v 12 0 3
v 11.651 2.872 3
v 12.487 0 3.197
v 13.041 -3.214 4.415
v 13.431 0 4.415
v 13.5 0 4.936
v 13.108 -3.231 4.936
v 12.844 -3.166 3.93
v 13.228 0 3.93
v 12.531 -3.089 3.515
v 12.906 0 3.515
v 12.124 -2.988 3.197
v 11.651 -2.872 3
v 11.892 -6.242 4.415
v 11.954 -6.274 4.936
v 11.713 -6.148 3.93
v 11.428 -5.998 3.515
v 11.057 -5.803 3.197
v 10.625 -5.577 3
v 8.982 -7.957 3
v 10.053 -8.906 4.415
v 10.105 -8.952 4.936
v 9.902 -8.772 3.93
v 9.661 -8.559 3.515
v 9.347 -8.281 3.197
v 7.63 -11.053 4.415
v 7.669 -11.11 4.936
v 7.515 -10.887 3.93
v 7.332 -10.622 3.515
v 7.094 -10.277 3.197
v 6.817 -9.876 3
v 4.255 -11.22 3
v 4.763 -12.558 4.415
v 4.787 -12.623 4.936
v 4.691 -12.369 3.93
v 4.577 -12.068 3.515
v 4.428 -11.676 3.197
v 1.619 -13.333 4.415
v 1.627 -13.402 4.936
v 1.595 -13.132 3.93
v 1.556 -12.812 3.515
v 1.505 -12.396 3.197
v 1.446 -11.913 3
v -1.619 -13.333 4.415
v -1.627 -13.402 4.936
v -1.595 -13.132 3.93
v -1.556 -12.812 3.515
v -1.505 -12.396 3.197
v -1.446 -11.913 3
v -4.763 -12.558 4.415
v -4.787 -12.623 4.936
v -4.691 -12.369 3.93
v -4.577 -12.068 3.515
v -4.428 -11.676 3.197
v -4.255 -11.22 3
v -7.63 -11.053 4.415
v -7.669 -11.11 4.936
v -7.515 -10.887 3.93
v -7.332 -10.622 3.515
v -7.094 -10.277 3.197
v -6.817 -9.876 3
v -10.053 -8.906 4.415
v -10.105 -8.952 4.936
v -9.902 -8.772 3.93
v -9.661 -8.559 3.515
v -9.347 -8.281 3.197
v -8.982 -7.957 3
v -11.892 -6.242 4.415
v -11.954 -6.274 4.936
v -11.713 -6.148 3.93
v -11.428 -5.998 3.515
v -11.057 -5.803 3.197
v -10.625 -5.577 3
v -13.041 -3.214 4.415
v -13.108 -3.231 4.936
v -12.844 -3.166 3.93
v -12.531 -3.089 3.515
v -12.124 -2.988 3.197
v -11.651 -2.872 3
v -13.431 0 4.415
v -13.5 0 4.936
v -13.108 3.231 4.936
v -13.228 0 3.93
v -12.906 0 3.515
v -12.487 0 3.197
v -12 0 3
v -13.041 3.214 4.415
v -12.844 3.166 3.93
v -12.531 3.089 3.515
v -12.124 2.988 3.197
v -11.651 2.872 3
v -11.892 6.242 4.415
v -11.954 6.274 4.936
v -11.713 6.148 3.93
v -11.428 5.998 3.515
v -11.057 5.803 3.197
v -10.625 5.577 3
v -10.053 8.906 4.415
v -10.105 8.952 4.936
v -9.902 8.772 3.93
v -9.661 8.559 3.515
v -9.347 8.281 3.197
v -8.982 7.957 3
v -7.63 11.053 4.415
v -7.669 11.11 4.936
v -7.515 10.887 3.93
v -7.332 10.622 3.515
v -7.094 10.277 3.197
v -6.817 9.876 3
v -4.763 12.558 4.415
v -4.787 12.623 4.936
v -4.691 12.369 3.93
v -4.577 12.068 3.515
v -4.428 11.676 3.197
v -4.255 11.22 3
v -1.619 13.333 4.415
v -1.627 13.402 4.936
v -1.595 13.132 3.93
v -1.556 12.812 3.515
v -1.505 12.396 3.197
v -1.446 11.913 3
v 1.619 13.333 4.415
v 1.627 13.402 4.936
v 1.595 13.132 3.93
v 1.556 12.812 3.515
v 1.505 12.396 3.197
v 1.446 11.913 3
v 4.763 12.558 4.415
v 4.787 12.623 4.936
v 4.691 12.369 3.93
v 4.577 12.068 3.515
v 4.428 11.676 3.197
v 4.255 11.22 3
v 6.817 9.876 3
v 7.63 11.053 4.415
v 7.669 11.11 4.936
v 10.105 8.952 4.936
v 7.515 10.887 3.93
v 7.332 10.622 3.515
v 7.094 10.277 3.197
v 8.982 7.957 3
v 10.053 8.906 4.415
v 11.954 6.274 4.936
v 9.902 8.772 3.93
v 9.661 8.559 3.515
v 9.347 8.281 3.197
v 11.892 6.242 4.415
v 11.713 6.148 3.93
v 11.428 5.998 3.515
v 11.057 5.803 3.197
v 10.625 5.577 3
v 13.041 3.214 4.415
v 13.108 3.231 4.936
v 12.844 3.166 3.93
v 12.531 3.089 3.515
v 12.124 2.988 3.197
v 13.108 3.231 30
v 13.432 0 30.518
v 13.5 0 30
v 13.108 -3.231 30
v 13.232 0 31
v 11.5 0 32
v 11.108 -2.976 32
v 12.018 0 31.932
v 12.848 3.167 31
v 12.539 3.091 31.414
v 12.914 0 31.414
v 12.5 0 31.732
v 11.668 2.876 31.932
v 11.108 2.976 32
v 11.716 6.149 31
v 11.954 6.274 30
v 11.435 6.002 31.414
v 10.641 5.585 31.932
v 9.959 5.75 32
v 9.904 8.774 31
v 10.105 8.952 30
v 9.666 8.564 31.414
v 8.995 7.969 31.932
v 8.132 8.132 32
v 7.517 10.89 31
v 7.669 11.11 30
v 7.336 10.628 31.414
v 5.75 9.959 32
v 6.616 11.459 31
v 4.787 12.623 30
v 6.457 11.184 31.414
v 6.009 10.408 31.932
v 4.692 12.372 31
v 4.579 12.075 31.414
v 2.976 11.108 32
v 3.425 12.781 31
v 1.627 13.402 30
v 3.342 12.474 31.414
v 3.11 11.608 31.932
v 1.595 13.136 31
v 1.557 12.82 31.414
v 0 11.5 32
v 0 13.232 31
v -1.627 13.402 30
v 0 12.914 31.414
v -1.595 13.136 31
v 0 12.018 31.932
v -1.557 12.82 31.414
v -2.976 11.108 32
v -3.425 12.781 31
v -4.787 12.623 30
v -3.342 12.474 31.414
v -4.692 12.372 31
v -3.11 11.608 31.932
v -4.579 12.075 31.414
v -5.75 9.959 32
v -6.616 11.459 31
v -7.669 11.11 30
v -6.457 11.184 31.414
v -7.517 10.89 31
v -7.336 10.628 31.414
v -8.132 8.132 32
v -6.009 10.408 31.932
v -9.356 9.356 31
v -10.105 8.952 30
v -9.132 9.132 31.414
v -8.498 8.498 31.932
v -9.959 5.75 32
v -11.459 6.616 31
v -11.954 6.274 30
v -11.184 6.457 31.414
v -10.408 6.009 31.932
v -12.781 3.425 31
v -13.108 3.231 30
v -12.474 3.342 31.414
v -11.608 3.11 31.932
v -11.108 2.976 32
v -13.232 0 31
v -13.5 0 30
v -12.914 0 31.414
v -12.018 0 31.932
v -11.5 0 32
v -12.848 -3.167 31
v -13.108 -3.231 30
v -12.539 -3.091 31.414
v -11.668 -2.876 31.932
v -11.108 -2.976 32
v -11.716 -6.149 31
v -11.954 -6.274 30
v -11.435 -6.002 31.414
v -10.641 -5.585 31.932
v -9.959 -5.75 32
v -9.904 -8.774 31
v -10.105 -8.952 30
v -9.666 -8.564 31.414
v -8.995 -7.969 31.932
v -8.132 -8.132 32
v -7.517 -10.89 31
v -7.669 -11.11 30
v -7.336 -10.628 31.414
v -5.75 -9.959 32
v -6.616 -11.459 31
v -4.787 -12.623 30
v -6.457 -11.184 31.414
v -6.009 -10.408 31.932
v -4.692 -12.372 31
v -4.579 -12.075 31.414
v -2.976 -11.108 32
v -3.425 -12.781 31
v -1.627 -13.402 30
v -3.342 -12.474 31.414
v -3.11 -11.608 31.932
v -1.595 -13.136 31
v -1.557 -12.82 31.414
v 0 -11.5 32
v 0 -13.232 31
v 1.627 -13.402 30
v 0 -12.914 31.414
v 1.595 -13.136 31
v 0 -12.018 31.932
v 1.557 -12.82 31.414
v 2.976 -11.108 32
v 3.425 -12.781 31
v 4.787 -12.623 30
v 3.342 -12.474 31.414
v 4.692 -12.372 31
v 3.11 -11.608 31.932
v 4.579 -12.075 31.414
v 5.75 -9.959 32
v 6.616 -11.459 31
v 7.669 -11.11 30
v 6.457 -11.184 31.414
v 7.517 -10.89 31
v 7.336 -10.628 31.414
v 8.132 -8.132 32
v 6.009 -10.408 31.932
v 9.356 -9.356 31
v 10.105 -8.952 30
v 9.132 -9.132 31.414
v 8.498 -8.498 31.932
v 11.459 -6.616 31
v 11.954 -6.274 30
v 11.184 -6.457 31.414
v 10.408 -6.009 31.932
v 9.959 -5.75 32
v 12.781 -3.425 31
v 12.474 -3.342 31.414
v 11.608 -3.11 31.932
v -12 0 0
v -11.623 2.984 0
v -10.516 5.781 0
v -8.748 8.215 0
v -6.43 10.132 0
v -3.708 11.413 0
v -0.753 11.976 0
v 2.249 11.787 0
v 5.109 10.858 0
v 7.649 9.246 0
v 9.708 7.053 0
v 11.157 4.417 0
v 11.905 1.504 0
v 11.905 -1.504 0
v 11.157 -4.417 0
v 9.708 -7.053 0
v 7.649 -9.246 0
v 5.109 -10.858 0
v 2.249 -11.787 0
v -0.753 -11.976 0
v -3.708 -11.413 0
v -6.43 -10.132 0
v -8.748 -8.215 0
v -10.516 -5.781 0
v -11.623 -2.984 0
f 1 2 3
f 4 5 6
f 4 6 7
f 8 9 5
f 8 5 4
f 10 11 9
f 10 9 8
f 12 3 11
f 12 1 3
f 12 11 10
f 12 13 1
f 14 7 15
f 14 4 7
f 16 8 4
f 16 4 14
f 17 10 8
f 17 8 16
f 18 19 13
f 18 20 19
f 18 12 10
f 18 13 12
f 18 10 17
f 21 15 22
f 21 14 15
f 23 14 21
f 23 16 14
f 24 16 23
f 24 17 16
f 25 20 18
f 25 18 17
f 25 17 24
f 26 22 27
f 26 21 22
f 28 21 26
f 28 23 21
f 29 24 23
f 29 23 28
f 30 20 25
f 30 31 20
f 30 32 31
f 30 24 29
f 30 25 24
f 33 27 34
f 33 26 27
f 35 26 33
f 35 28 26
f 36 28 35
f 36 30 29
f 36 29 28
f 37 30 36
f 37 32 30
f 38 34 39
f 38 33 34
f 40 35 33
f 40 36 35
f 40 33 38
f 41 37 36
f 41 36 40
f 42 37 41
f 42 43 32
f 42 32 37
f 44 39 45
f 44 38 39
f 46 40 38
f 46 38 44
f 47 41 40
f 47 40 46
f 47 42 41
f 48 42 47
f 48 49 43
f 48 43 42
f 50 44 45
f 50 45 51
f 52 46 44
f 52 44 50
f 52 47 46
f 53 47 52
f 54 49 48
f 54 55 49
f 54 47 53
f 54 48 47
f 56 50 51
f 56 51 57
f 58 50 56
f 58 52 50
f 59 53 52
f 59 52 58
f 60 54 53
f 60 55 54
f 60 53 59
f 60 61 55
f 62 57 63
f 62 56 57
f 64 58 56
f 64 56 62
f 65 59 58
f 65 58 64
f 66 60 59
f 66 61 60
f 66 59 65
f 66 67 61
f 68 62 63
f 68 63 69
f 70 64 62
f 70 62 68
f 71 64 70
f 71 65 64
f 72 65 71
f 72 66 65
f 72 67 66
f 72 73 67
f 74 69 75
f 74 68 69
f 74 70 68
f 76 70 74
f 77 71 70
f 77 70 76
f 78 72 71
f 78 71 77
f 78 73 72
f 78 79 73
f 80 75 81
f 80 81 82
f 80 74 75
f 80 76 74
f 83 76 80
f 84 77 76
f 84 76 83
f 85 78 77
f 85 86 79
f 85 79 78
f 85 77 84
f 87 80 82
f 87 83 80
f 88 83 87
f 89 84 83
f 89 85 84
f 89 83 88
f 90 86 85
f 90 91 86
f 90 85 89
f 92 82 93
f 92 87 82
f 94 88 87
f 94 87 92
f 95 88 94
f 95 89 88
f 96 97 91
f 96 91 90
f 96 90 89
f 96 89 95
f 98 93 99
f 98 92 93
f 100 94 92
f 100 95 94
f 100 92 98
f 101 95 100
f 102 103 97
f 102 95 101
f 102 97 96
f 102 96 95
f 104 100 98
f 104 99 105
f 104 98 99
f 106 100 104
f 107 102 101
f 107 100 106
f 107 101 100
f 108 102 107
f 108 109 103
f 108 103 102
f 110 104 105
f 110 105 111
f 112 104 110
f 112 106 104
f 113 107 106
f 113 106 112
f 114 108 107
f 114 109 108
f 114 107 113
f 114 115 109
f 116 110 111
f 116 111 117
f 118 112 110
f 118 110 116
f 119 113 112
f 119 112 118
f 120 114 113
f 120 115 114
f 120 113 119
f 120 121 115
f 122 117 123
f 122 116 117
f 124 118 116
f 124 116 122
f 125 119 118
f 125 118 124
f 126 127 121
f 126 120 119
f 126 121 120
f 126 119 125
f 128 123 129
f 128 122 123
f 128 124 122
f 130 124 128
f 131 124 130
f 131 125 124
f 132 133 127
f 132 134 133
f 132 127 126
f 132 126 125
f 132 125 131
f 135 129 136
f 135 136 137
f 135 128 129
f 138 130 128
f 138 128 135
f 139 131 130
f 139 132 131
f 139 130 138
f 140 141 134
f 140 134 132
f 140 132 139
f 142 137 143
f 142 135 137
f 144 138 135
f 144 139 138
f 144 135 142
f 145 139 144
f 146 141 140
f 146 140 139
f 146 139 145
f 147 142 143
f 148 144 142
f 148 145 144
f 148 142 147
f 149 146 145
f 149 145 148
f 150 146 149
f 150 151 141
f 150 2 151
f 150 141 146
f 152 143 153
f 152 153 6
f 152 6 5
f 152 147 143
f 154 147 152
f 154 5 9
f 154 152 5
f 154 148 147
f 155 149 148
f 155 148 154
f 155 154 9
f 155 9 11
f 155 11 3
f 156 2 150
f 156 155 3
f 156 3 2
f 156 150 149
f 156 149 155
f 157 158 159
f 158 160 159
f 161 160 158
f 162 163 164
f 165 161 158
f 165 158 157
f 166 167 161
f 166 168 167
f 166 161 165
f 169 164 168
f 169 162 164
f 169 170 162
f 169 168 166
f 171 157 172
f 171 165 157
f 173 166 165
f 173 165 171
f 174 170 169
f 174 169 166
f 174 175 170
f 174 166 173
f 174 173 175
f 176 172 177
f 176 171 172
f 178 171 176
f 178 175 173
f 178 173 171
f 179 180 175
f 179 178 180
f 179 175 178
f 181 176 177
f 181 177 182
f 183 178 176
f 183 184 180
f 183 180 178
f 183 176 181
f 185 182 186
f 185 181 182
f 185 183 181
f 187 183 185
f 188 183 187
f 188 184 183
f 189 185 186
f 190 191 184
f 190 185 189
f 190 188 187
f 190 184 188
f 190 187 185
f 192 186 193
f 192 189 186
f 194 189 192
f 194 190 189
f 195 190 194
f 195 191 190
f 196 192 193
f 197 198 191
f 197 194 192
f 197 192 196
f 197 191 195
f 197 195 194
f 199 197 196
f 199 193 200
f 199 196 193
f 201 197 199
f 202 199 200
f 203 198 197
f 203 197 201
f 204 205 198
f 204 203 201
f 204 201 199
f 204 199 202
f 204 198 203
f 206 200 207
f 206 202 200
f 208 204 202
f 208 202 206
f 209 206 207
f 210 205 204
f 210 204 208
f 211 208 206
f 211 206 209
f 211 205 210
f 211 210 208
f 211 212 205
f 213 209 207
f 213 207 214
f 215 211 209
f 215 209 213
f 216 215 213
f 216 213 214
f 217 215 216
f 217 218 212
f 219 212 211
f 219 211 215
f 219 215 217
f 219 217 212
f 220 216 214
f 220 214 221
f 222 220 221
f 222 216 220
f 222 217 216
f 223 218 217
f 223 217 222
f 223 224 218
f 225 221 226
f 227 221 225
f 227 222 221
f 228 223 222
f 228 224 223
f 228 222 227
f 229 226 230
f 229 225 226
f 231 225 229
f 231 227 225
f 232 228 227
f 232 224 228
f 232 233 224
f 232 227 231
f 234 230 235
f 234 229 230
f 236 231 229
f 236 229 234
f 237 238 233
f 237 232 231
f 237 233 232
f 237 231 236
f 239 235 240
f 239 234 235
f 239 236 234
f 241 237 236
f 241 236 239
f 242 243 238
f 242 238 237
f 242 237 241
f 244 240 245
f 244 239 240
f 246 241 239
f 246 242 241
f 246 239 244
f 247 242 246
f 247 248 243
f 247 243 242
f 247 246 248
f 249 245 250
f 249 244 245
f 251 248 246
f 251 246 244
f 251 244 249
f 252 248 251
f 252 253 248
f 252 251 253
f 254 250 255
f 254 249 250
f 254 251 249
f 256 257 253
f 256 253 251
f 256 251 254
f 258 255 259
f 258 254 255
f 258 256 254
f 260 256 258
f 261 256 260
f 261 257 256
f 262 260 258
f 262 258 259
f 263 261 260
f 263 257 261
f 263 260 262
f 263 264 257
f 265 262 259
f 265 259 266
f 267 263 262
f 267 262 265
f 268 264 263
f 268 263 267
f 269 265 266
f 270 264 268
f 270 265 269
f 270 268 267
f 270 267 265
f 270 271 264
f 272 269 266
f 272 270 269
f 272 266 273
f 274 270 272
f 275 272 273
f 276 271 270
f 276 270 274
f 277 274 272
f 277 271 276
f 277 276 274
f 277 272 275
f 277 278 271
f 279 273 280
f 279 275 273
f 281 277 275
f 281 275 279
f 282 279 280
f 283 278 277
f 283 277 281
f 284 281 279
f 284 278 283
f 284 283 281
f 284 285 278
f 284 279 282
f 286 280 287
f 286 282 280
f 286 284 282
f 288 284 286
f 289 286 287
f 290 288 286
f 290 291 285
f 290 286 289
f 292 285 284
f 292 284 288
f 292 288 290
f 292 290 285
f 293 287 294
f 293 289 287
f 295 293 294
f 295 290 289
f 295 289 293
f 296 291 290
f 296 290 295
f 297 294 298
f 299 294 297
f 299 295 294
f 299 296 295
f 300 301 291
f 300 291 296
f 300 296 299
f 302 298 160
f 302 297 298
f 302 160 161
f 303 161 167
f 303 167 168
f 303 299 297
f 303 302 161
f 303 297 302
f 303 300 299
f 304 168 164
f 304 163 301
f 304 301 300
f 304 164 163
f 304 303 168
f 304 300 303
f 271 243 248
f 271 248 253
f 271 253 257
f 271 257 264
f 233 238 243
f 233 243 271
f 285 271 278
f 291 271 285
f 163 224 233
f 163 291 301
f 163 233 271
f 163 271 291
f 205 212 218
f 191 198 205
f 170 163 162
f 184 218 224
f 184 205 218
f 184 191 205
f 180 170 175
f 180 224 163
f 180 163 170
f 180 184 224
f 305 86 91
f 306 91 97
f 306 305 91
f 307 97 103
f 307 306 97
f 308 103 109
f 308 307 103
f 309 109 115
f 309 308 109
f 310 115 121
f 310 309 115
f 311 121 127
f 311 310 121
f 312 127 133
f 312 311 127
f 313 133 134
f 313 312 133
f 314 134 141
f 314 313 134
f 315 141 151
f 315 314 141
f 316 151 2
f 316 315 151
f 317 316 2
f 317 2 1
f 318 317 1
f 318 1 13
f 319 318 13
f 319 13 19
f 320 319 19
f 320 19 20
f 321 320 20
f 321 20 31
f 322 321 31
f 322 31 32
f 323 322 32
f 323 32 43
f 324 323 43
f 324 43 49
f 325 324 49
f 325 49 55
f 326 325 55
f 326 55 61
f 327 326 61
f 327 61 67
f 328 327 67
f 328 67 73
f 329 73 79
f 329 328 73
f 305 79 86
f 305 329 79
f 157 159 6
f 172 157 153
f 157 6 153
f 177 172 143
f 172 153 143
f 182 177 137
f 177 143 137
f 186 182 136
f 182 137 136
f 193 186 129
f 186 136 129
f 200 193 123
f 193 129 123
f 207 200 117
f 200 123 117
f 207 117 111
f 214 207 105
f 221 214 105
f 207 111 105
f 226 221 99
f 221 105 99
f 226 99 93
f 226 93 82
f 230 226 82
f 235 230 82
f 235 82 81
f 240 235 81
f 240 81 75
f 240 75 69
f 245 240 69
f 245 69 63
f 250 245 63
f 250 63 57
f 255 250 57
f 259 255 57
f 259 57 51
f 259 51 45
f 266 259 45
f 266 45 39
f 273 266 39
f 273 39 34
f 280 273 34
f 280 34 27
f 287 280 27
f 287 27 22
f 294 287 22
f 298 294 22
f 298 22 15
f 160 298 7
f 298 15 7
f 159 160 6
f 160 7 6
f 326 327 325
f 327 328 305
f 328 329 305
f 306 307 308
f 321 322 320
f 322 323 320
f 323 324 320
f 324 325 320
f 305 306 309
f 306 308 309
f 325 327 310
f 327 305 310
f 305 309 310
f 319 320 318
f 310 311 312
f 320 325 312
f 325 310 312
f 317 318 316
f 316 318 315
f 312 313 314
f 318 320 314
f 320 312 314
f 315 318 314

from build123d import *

# Parameters (mm, degrees)
SKETCH1_R           = 13.5
BOSS_EXTRUDE1_DEPTH = 32
FILLET1_R           = 2
SKETCH2_R           = 14.634398313
SKETCH2_R_2         = 12
CUT_EXTRUDE1_DEPTH  = 3
FILLET2_R           = 2


with BuildPart() as part:
    # Sketch1 → Boss-Extrude1 (new body)
    with BuildSketch(Plane.XY):
        Circle(SKETCH1_R)
    extrude(amount=BOSS_EXTRUDE1_DEPTH)

    # Fillet1
    fillet1_edges = [part.edges().sort_by_distance(p)[0] for p in [
        (-13.5, 0, 32),
    ]]
    fillet(fillet1_edges, radius=FILLET1_R)

    # Sketch2 → Cut-Extrude1 (cut)
    with BuildSketch(Plane(origin=(0, 0, 0), x_dir=(-1, 0, 0), z_dir=(0, 0, -1))):
        Circle(SKETCH2_R)
        Circle(SKETCH2_R_2, mode=Mode.SUBTRACT)
    extrude(amount=-CUT_EXTRUDE1_DEPTH, mode=Mode.SUBTRACT)

    # Fillet2
    # the kernel refuses this fillet: 2 mm, written as the material it takes off along each edge
    with BuildSketch(Plane(origin=(0, 0, 3), x_dir=(1, 0, 0), z_dir=(0, 1, 0))) as fillet2_piece_1:
        with BuildLine():
            CenterArc((11.5, -1.936491673), FILLET2_R, 0, 75.522487814)
            Line((12, 0), (12.01, 0.038729833))
            ThreePointArc((12.01, 0.038729833), (12.75, 0.04), (13.5, 0.04))
            Line((13.5, 0.04), (13.54, 0))
            Line((13.54, 0), (13.54, -1.936491673))
            Line((13.54, -1.936491673), (13.5, -1.936491673))
        make_face()
    revolve(axis=Axis((0, 0, 3), (0, 0, -1)), mode=Mode.SUBTRACT)


solid = part.part
